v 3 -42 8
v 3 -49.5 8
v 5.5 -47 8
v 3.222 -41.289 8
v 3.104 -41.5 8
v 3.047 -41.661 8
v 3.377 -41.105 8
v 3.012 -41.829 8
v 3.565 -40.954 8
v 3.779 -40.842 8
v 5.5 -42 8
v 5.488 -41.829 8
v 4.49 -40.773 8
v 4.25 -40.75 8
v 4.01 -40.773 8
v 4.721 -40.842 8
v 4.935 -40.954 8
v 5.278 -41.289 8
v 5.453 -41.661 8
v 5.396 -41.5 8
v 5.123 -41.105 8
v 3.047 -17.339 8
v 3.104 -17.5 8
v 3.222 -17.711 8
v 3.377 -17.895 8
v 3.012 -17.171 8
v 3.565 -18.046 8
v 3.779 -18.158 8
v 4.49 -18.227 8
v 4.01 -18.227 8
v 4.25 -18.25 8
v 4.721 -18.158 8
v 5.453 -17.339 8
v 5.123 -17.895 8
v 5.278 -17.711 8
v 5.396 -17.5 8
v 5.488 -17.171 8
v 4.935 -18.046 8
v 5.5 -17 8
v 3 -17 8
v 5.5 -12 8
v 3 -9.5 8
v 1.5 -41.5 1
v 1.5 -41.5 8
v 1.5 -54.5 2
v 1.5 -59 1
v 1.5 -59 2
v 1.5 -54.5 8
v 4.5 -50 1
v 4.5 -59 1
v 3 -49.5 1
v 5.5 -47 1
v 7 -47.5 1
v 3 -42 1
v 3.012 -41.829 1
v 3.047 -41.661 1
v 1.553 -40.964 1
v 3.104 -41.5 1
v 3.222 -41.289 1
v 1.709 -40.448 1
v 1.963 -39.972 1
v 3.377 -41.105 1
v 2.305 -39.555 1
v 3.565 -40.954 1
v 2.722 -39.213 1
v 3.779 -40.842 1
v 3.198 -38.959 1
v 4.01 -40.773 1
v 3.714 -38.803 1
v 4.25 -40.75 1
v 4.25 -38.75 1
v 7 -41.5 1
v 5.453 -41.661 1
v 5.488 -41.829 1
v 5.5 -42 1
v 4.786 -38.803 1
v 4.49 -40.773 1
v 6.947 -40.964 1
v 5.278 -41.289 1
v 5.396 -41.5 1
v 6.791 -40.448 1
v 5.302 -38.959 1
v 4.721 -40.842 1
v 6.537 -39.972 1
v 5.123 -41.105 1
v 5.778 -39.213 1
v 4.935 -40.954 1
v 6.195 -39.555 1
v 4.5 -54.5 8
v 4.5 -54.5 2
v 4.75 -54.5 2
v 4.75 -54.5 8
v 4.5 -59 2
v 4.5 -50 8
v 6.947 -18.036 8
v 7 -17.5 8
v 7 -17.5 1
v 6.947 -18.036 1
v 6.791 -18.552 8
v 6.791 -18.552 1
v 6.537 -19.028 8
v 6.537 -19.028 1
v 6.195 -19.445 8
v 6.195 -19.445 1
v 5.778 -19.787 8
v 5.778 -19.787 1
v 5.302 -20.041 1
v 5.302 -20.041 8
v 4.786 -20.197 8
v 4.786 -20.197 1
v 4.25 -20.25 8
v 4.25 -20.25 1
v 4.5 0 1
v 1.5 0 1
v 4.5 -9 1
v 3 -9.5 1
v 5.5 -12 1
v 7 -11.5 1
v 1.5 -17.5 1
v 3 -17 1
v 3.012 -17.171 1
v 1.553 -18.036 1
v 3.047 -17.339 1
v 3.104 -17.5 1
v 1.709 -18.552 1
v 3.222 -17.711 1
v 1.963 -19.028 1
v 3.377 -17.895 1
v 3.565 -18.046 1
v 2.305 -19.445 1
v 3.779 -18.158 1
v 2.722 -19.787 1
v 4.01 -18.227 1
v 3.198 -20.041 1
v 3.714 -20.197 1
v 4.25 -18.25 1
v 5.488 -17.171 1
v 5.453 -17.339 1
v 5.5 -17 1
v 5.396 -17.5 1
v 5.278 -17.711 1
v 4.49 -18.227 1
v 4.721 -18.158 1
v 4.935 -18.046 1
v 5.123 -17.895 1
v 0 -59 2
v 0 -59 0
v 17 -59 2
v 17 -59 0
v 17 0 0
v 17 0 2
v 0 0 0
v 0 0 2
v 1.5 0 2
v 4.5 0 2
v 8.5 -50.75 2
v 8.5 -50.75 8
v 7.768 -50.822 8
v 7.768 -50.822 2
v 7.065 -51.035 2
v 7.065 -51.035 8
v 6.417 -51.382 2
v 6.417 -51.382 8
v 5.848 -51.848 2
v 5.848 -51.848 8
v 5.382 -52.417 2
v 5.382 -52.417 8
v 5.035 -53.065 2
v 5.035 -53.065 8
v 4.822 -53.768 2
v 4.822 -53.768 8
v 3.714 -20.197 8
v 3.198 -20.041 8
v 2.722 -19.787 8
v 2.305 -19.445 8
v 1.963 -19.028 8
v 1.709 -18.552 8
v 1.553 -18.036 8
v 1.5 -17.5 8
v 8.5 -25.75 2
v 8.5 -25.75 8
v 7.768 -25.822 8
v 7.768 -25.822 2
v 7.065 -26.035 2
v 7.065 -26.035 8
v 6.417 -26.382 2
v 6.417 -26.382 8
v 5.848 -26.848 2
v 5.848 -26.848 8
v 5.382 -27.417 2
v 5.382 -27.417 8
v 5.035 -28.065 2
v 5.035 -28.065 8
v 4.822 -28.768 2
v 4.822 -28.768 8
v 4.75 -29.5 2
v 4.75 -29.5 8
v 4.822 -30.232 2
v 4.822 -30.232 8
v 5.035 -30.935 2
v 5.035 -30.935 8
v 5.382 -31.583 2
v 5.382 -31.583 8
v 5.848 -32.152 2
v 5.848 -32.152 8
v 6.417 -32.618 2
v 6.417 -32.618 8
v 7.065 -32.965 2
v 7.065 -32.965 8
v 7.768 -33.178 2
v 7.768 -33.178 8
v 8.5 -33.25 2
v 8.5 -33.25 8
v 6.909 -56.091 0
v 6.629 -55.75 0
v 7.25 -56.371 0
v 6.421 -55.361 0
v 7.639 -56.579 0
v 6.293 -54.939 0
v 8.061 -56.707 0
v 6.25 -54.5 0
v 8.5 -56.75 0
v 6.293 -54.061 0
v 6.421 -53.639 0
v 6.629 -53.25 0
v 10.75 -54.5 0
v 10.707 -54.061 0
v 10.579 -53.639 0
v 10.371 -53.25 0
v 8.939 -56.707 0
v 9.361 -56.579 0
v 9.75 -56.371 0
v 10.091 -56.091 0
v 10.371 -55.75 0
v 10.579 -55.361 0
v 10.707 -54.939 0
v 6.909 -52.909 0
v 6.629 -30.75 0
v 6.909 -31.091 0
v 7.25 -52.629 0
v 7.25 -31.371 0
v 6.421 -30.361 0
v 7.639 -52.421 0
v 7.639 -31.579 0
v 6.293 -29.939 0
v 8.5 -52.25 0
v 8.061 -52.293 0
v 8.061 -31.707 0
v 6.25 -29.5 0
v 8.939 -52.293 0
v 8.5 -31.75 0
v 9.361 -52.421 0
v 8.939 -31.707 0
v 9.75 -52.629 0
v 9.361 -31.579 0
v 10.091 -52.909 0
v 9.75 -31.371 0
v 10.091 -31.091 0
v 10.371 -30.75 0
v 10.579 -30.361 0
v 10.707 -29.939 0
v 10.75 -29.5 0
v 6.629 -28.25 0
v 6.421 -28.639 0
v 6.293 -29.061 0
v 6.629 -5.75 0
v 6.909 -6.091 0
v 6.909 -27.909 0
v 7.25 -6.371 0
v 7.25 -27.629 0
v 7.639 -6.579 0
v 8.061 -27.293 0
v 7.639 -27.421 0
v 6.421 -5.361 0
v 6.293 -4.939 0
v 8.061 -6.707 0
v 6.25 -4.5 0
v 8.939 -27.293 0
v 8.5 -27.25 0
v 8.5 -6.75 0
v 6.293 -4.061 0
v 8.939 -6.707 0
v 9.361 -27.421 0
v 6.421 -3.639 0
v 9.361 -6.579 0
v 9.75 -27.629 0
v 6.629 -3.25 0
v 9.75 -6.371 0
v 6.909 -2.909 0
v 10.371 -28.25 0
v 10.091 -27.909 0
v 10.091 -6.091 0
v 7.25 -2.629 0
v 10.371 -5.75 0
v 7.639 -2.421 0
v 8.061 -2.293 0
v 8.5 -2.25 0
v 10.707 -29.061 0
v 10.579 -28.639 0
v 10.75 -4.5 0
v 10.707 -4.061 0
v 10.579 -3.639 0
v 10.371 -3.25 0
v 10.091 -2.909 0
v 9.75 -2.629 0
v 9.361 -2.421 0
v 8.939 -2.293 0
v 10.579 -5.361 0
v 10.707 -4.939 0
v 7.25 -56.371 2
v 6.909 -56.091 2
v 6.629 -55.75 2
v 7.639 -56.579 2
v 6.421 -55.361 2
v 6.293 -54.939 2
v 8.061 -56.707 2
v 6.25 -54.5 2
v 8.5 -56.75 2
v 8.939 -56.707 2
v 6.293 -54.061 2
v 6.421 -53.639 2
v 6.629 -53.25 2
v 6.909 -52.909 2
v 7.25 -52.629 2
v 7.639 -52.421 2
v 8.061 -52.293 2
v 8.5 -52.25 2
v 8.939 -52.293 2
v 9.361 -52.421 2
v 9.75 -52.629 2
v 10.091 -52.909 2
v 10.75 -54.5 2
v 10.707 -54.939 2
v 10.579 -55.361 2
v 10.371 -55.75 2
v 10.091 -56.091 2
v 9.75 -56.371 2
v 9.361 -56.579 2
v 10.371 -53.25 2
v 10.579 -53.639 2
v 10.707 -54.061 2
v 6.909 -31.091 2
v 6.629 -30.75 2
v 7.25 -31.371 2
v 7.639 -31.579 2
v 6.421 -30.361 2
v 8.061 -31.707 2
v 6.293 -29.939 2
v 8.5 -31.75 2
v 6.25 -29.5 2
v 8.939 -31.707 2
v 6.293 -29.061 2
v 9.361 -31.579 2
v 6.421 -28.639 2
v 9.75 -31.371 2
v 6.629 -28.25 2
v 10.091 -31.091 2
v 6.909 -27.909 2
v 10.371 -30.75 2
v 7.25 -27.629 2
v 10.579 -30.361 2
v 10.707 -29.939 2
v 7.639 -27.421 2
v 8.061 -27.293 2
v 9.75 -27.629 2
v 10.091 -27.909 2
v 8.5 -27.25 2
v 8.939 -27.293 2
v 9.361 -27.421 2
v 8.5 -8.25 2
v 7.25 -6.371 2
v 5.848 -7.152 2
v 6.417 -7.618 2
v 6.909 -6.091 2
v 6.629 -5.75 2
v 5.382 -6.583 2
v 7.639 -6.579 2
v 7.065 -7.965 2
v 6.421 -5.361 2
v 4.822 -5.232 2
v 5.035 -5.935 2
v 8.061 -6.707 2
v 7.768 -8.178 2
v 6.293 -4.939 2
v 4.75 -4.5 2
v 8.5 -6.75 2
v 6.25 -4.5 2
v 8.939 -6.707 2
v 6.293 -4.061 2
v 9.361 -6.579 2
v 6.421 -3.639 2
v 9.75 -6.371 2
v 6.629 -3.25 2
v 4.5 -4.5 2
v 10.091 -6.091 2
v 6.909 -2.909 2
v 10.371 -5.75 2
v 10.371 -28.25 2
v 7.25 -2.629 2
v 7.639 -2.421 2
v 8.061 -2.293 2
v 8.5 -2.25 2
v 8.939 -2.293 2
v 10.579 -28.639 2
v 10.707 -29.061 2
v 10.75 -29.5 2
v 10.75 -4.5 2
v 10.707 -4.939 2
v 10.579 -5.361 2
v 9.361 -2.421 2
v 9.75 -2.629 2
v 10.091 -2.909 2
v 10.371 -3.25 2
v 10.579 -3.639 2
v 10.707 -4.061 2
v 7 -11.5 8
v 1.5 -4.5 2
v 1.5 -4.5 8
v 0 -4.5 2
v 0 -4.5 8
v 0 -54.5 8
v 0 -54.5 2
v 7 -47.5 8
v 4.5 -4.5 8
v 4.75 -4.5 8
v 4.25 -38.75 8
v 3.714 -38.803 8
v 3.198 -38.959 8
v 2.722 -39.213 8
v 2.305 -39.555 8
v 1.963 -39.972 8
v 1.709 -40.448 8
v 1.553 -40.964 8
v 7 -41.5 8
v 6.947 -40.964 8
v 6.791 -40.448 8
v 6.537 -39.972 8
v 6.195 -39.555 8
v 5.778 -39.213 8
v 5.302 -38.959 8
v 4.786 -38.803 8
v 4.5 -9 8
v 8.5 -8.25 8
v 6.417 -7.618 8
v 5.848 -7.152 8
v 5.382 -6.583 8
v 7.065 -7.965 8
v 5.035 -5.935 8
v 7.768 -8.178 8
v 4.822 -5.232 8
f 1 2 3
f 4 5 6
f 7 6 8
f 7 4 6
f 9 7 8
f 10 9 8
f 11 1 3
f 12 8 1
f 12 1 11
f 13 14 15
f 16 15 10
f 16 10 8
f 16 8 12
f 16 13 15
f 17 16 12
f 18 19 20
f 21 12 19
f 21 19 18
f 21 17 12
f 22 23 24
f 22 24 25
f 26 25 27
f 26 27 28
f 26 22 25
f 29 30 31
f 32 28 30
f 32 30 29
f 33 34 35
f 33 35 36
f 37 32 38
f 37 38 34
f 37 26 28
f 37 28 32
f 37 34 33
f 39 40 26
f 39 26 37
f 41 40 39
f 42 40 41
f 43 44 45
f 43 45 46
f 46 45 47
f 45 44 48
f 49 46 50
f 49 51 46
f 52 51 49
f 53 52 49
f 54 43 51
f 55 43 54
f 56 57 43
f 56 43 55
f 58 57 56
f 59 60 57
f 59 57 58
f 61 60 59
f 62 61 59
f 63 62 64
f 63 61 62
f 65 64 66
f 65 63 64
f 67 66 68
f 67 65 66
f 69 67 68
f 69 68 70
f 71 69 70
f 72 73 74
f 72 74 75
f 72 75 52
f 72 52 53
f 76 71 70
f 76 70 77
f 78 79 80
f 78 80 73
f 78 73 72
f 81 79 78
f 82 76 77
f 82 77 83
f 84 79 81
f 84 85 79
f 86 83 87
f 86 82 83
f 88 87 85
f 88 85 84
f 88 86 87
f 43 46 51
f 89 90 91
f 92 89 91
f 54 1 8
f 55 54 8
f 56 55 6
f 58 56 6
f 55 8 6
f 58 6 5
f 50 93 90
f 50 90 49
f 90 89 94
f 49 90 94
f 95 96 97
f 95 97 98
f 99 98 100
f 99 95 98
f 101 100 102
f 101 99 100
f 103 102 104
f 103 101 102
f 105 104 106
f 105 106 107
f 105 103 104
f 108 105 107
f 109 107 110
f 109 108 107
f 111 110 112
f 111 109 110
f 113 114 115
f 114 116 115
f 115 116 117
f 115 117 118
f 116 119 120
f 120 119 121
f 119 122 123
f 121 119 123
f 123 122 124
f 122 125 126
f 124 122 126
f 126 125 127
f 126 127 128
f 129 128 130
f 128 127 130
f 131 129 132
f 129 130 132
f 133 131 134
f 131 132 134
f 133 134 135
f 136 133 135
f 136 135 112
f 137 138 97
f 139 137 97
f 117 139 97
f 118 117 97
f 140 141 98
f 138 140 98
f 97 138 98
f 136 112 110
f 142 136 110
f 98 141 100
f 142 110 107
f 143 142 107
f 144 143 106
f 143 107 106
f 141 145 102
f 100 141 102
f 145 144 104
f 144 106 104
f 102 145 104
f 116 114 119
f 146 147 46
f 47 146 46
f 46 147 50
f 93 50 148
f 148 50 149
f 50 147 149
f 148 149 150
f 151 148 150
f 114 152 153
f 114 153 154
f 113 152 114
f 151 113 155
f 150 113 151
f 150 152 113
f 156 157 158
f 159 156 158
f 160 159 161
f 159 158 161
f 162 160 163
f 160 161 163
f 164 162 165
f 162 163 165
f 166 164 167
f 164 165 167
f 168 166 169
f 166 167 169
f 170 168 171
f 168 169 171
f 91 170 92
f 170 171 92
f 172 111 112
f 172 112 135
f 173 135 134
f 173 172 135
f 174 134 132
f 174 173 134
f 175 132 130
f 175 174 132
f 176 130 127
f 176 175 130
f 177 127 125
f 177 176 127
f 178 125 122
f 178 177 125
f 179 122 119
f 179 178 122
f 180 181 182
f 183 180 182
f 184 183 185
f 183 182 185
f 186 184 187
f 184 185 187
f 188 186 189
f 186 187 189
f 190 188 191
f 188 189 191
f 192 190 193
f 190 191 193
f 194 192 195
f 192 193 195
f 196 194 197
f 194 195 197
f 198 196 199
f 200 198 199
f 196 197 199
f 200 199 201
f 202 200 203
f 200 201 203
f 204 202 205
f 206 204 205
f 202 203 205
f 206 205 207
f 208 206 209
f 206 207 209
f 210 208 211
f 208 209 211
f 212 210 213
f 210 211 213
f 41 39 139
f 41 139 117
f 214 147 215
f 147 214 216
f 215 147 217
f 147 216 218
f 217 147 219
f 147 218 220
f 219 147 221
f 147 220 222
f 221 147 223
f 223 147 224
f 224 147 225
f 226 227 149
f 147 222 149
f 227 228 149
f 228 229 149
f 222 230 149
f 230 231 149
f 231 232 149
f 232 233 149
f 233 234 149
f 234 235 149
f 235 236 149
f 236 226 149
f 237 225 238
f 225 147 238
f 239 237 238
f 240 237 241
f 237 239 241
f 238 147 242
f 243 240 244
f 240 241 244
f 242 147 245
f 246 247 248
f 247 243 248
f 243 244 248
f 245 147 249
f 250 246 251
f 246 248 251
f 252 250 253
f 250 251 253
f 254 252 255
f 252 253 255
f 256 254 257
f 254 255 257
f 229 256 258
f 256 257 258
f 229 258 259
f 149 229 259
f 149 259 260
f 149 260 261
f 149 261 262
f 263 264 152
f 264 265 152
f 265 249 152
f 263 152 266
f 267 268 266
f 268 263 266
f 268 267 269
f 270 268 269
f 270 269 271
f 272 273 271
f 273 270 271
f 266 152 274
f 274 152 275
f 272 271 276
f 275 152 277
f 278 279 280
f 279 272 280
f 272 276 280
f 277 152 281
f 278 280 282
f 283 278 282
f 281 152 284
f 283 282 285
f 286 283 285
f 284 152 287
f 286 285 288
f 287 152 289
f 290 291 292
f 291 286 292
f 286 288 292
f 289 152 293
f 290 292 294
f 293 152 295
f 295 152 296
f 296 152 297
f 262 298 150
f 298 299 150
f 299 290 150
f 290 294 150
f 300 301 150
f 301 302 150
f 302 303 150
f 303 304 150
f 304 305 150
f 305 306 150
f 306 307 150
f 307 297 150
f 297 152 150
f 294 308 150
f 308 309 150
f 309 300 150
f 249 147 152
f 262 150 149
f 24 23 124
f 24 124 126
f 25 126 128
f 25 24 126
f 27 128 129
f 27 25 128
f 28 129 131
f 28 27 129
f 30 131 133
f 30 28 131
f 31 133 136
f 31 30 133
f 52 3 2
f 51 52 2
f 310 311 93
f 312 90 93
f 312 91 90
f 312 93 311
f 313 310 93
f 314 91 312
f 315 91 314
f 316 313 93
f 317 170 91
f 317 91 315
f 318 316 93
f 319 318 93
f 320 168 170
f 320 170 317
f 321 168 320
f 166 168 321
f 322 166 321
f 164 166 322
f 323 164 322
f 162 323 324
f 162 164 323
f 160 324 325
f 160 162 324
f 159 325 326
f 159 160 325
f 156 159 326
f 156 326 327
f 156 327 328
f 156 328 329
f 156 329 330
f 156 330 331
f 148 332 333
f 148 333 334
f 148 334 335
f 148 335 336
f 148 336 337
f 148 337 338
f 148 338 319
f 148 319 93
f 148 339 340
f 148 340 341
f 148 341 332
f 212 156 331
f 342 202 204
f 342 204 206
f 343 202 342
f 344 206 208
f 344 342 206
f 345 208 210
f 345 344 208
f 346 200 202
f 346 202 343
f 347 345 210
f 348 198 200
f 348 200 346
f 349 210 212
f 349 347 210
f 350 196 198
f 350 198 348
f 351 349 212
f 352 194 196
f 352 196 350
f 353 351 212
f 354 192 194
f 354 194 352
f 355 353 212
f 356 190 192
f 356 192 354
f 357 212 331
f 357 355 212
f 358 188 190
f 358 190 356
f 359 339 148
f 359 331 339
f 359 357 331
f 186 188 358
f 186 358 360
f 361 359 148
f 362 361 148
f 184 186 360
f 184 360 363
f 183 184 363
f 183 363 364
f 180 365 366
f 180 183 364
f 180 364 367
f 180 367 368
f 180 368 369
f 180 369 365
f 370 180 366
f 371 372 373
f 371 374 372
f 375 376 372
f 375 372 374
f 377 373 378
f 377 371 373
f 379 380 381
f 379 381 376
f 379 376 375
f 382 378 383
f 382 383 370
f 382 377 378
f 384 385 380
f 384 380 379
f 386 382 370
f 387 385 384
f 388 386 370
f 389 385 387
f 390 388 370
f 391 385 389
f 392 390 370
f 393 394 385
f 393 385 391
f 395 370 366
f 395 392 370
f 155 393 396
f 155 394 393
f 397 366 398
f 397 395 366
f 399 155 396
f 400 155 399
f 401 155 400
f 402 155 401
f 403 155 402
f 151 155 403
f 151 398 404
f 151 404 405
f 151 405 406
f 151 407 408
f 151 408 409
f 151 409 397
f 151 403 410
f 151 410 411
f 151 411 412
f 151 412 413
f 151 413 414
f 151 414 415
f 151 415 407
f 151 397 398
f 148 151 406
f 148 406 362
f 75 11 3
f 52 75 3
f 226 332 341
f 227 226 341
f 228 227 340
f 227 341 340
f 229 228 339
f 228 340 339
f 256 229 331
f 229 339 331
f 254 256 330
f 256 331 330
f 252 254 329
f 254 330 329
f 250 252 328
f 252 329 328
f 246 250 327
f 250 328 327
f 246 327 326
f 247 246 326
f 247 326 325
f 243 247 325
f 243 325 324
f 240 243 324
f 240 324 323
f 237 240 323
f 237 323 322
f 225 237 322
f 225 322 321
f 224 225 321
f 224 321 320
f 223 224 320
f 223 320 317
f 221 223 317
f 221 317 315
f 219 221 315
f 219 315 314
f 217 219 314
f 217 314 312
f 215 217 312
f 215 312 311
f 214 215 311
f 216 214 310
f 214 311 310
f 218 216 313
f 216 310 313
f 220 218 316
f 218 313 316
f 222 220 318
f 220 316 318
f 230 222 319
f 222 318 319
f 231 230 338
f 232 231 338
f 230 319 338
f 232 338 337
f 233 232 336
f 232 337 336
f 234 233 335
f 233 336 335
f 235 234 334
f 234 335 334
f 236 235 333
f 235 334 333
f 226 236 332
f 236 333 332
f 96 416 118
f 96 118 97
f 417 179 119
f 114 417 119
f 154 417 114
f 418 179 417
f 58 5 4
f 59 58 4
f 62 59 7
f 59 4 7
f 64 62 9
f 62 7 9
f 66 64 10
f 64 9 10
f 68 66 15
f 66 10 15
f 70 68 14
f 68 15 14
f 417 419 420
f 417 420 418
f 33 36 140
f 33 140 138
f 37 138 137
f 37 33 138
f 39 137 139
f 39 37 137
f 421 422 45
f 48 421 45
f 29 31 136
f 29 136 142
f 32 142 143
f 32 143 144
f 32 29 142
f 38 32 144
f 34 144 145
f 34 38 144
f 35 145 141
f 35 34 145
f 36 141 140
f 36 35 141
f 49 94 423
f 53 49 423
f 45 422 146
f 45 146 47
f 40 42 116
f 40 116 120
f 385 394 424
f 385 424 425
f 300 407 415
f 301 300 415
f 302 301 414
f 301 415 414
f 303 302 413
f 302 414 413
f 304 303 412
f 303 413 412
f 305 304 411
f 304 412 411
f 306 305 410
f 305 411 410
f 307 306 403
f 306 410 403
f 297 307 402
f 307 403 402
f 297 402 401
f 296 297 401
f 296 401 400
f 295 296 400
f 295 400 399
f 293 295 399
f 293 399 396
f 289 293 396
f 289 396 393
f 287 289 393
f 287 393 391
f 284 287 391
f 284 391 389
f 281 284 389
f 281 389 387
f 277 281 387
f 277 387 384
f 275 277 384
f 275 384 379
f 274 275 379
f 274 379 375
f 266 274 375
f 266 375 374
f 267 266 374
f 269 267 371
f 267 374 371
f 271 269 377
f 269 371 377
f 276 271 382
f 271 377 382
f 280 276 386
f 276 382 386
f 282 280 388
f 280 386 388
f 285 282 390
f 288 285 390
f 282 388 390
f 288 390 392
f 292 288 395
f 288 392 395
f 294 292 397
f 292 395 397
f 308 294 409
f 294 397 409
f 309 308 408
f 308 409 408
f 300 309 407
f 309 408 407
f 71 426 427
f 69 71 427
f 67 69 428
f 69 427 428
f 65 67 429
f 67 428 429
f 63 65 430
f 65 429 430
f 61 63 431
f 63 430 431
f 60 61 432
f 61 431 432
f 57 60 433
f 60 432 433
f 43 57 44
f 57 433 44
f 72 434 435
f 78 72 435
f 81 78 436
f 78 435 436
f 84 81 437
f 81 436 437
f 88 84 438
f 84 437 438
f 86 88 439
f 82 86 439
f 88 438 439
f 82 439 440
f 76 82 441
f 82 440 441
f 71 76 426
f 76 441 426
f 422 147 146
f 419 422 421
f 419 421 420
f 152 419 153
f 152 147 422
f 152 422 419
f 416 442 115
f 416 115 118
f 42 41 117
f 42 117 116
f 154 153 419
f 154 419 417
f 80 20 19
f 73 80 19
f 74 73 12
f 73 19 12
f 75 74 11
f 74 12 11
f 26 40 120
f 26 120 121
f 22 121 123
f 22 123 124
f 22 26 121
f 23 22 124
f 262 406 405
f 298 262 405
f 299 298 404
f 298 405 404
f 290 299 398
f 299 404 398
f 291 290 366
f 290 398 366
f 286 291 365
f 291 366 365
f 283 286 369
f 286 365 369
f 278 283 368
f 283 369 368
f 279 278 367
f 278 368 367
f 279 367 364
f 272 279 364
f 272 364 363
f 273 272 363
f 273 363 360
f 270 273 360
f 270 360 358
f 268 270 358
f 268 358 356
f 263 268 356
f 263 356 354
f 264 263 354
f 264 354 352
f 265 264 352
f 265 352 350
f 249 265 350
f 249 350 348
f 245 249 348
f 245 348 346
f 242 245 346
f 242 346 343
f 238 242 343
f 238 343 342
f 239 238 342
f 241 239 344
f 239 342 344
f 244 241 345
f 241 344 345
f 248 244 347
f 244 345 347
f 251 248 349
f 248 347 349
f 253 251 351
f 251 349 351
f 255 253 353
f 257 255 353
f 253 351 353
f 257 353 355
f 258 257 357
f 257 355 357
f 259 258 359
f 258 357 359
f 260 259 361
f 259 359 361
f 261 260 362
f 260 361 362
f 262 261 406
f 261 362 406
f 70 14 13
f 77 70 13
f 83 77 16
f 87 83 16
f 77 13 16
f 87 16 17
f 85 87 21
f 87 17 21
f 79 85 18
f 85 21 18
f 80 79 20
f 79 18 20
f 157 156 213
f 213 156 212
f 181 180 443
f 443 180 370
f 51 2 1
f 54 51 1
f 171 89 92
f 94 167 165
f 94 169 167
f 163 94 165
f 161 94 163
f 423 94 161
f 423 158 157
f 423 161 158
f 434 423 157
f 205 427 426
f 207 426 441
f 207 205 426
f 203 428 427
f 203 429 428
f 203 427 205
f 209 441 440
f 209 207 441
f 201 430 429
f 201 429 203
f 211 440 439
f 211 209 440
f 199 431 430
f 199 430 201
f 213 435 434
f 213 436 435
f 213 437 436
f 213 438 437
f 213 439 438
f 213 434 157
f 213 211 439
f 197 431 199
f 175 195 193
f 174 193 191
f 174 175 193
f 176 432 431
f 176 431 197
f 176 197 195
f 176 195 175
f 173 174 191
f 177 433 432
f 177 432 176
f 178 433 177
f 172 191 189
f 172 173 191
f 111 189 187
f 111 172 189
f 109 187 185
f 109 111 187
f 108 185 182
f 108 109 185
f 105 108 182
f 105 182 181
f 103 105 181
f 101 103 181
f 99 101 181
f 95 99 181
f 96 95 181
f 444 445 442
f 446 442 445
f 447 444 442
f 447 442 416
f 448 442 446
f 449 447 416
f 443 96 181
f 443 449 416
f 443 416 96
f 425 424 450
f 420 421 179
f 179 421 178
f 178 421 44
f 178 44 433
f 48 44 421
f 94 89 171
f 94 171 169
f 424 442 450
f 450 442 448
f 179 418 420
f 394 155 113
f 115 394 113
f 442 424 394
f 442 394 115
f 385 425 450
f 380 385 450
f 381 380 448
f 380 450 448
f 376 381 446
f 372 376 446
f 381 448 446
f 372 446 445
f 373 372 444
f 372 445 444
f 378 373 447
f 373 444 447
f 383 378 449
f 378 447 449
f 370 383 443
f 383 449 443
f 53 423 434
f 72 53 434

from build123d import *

# Parameters (mm, degrees)
ESQUISSE1_W             = 17
ESQUISSE1_H             = 59
BOSS_EXTRU_1_DEPTH      = 2
ESQUISSE2_W             = 8.5
ESQUISSE2_H             = 50
BOSS_EXTRU_2_DEPTH      = 6
ESQUISSE4_R             = 2.25
ENL_V_MAT_EXTRU_6_DEPTH = 27
ESQUISSE3_W             = 1.5
ESQUISSE3_H             = 7
ENL_V_MAT_EXTRU_7_DEPTH = 7
ESQUISSE5_R             = 3.75
ENL_V_MAT_EXTRU_8_DEPTH = 6


with BuildPart() as part:
    # Esquisse1 → Boss.-Extru.1 (new body)
    with BuildSketch(Plane.XY):
        with Locations((8.5, -29.5)):
            Rectangle(ESQUISSE1_W, ESQUISSE1_H)
    extrude(amount=BOSS_EXTRU_1_DEPTH)

    # Esquisse2 → Boss.-Extru.2 (add)
    with BuildSketch(Plane.XY.offset(2)):
        with Locations((4.25, -29.5)):
            Rectangle(ESQUISSE2_W, ESQUISSE2_H)
    extrude(amount=BOSS_EXTRU_2_DEPTH)

    # Esquisse4 → Enlèv. mat.-Extru.6 (cut)
    with BuildSketch(Plane.XY.offset(8)):
        with Locations((8.5, -54.5)):
            Circle(ESQUISSE4_R)
        with Locations((8.5, -29.5)):
            Circle(ESQUISSE4_R)
        with Locations((8.5, -4.5)):
            Circle(ESQUISSE4_R)
    extrude(amount=-ENL_V_MAT_EXTRU_6_DEPTH, mode=Mode.SUBTRACT)

    # Esquisse3 → Enlèv. mat.-Extru.7 (cut)
    with BuildSketch(Plane.XY.offset(8)):
        with Locations((2.25, -58)):
            Rectangle(ESQUISSE3_W, ESQUISSE3_H)
        with Locations((3.75, -58)):
            Rectangle(ESQUISSE3_W, ESQUISSE3_H)
        Polygon((4.5, -48), (3, -49.5), (3, -54.5), (4.5, -54.5), (4.5, -50), align=None)
        Polygon((3, -49.5), (3, -42), (3, -41.5), (1.5, -41.5), (1.5, -54.5), (3, -54.5), align=None)
        Polygon((5.5, -41.5), (5.5, -42), (5.5, -47), (4.5, -48), (4.5, -50), (7, -47.5), (7, -41.5), align=None)
        with BuildLine():
            Line((4.25, -38.75), (4.25, -40.75))
            ThreePointArc((4.25, -40.75), (4.934653197, -40.954174967), (5.395643924, -41.5))
            Line((5.395643924, -41.5), (5.5, -41.5))
            Line((5.5, -41.5), (7, -41.5))
            ThreePointArc((7, -41.5), (6.194543648, -39.555456352), (4.25, -38.75))
        make_face()
        with BuildLine():
            Line((1.5, -41.5), (3, -41.5))
            Line((3, -41.5), (3.104356076, -41.5))
            ThreePointArc((3.104356076, -41.5), (3.565346803, -40.954174967), (4.25, -40.75))
            Line((4.25, -40.75), (4.25, -38.75))
            ThreePointArc((4.25, -38.75), (2.305456352, -39.555456352), (1.5, -41.5))
        make_face()
        with BuildLine():
            Line((3, -41.5), (3, -42))
            ThreePointArc((3, -42), (3.026367109, -41.744612945), (3.104356076, -41.5))
            Line((3.104356076, -41.5), (3, -41.5))
        make_face()
        with BuildLine():
            ThreePointArc((5.395643924, -41.5), (5.473632891, -41.744612945), (5.5, -42))
            Line((5.5, -42), (5.5, -41.5))
            Line((5.5, -41.5), (5.395643924, -41.5))
        make_face()
    enl_v_mat_extru_7 = extrude(amount=-ENL_V_MAT_EXTRU_7_DEPTH, mode=Mode.SUBTRACT)

    # Symétrie1: Enlèv. mat.-Extru.7 across plane
    add(enl_v_mat_extru_7.mirror(Plane.ZX.offset(-29.5)), mode=Mode.SUBTRACT)

    # Esquisse5 → Enlèv. mat.-Extru.8 (cut)
    with BuildSketch(Plane.XY.offset(8)):
        with Locations((8.5, -29.5)):
            Circle(ESQUISSE5_R)
        with Locations((8.5, -4.5)):
            Circle(ESQUISSE5_R)
        with Locations((8.5, -54.5)):
            Circle(ESQUISSE5_R)
    extrude(amount=-ENL_V_MAT_EXTRU_8_DEPTH, mode=Mode.SUBTRACT)


solid = part.part
